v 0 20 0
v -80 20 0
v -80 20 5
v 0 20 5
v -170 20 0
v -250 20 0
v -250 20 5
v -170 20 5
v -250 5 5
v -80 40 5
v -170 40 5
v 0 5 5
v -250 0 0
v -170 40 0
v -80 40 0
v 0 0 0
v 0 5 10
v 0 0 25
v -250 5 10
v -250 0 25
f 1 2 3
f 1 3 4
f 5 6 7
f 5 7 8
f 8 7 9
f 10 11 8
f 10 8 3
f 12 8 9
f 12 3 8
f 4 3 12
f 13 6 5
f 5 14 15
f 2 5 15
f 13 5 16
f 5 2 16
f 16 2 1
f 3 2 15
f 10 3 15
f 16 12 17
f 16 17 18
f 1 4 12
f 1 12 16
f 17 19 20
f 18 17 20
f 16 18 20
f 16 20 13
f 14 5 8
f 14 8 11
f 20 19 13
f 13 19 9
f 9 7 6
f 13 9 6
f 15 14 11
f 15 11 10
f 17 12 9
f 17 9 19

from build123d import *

# Parameters (mm, degrees)
ESQUISSE1_W        = 90
ESQUISSE1_H        = 20
ESQUISSE1_W_2      = 250
BOSS_EXTRU_1_DEPTH = 5
BOSS_EXTRU_2_DEPTH = 250


with BuildPart() as part:
    # Esquisse1 → Boss.-Extru.1 (new body)
    with BuildSketch(Plane.XY):
        with Locations((-125, 30)):
            Rectangle(ESQUISSE1_W, ESQUISSE1_H)
        with Locations((-125, 10)):
            Rectangle(ESQUISSE1_W_2, ESQUISSE1_H)
    extrude(amount=BOSS_EXTRU_1_DEPTH)

    # Esquisse2 → Boss.-Extru.2 (add)
    with BuildSketch(Plane(origin=(0, 0, 0), x_dir=(0, 0, -1), z_dir=(1, 0, 0))):
        Polygon((-25, 0), (-5, 0), (-5, 5), (-10, 5), align=None)
    extrude(amount=-BOSS_EXTRU_2_DEPTH)


solid = part.part
